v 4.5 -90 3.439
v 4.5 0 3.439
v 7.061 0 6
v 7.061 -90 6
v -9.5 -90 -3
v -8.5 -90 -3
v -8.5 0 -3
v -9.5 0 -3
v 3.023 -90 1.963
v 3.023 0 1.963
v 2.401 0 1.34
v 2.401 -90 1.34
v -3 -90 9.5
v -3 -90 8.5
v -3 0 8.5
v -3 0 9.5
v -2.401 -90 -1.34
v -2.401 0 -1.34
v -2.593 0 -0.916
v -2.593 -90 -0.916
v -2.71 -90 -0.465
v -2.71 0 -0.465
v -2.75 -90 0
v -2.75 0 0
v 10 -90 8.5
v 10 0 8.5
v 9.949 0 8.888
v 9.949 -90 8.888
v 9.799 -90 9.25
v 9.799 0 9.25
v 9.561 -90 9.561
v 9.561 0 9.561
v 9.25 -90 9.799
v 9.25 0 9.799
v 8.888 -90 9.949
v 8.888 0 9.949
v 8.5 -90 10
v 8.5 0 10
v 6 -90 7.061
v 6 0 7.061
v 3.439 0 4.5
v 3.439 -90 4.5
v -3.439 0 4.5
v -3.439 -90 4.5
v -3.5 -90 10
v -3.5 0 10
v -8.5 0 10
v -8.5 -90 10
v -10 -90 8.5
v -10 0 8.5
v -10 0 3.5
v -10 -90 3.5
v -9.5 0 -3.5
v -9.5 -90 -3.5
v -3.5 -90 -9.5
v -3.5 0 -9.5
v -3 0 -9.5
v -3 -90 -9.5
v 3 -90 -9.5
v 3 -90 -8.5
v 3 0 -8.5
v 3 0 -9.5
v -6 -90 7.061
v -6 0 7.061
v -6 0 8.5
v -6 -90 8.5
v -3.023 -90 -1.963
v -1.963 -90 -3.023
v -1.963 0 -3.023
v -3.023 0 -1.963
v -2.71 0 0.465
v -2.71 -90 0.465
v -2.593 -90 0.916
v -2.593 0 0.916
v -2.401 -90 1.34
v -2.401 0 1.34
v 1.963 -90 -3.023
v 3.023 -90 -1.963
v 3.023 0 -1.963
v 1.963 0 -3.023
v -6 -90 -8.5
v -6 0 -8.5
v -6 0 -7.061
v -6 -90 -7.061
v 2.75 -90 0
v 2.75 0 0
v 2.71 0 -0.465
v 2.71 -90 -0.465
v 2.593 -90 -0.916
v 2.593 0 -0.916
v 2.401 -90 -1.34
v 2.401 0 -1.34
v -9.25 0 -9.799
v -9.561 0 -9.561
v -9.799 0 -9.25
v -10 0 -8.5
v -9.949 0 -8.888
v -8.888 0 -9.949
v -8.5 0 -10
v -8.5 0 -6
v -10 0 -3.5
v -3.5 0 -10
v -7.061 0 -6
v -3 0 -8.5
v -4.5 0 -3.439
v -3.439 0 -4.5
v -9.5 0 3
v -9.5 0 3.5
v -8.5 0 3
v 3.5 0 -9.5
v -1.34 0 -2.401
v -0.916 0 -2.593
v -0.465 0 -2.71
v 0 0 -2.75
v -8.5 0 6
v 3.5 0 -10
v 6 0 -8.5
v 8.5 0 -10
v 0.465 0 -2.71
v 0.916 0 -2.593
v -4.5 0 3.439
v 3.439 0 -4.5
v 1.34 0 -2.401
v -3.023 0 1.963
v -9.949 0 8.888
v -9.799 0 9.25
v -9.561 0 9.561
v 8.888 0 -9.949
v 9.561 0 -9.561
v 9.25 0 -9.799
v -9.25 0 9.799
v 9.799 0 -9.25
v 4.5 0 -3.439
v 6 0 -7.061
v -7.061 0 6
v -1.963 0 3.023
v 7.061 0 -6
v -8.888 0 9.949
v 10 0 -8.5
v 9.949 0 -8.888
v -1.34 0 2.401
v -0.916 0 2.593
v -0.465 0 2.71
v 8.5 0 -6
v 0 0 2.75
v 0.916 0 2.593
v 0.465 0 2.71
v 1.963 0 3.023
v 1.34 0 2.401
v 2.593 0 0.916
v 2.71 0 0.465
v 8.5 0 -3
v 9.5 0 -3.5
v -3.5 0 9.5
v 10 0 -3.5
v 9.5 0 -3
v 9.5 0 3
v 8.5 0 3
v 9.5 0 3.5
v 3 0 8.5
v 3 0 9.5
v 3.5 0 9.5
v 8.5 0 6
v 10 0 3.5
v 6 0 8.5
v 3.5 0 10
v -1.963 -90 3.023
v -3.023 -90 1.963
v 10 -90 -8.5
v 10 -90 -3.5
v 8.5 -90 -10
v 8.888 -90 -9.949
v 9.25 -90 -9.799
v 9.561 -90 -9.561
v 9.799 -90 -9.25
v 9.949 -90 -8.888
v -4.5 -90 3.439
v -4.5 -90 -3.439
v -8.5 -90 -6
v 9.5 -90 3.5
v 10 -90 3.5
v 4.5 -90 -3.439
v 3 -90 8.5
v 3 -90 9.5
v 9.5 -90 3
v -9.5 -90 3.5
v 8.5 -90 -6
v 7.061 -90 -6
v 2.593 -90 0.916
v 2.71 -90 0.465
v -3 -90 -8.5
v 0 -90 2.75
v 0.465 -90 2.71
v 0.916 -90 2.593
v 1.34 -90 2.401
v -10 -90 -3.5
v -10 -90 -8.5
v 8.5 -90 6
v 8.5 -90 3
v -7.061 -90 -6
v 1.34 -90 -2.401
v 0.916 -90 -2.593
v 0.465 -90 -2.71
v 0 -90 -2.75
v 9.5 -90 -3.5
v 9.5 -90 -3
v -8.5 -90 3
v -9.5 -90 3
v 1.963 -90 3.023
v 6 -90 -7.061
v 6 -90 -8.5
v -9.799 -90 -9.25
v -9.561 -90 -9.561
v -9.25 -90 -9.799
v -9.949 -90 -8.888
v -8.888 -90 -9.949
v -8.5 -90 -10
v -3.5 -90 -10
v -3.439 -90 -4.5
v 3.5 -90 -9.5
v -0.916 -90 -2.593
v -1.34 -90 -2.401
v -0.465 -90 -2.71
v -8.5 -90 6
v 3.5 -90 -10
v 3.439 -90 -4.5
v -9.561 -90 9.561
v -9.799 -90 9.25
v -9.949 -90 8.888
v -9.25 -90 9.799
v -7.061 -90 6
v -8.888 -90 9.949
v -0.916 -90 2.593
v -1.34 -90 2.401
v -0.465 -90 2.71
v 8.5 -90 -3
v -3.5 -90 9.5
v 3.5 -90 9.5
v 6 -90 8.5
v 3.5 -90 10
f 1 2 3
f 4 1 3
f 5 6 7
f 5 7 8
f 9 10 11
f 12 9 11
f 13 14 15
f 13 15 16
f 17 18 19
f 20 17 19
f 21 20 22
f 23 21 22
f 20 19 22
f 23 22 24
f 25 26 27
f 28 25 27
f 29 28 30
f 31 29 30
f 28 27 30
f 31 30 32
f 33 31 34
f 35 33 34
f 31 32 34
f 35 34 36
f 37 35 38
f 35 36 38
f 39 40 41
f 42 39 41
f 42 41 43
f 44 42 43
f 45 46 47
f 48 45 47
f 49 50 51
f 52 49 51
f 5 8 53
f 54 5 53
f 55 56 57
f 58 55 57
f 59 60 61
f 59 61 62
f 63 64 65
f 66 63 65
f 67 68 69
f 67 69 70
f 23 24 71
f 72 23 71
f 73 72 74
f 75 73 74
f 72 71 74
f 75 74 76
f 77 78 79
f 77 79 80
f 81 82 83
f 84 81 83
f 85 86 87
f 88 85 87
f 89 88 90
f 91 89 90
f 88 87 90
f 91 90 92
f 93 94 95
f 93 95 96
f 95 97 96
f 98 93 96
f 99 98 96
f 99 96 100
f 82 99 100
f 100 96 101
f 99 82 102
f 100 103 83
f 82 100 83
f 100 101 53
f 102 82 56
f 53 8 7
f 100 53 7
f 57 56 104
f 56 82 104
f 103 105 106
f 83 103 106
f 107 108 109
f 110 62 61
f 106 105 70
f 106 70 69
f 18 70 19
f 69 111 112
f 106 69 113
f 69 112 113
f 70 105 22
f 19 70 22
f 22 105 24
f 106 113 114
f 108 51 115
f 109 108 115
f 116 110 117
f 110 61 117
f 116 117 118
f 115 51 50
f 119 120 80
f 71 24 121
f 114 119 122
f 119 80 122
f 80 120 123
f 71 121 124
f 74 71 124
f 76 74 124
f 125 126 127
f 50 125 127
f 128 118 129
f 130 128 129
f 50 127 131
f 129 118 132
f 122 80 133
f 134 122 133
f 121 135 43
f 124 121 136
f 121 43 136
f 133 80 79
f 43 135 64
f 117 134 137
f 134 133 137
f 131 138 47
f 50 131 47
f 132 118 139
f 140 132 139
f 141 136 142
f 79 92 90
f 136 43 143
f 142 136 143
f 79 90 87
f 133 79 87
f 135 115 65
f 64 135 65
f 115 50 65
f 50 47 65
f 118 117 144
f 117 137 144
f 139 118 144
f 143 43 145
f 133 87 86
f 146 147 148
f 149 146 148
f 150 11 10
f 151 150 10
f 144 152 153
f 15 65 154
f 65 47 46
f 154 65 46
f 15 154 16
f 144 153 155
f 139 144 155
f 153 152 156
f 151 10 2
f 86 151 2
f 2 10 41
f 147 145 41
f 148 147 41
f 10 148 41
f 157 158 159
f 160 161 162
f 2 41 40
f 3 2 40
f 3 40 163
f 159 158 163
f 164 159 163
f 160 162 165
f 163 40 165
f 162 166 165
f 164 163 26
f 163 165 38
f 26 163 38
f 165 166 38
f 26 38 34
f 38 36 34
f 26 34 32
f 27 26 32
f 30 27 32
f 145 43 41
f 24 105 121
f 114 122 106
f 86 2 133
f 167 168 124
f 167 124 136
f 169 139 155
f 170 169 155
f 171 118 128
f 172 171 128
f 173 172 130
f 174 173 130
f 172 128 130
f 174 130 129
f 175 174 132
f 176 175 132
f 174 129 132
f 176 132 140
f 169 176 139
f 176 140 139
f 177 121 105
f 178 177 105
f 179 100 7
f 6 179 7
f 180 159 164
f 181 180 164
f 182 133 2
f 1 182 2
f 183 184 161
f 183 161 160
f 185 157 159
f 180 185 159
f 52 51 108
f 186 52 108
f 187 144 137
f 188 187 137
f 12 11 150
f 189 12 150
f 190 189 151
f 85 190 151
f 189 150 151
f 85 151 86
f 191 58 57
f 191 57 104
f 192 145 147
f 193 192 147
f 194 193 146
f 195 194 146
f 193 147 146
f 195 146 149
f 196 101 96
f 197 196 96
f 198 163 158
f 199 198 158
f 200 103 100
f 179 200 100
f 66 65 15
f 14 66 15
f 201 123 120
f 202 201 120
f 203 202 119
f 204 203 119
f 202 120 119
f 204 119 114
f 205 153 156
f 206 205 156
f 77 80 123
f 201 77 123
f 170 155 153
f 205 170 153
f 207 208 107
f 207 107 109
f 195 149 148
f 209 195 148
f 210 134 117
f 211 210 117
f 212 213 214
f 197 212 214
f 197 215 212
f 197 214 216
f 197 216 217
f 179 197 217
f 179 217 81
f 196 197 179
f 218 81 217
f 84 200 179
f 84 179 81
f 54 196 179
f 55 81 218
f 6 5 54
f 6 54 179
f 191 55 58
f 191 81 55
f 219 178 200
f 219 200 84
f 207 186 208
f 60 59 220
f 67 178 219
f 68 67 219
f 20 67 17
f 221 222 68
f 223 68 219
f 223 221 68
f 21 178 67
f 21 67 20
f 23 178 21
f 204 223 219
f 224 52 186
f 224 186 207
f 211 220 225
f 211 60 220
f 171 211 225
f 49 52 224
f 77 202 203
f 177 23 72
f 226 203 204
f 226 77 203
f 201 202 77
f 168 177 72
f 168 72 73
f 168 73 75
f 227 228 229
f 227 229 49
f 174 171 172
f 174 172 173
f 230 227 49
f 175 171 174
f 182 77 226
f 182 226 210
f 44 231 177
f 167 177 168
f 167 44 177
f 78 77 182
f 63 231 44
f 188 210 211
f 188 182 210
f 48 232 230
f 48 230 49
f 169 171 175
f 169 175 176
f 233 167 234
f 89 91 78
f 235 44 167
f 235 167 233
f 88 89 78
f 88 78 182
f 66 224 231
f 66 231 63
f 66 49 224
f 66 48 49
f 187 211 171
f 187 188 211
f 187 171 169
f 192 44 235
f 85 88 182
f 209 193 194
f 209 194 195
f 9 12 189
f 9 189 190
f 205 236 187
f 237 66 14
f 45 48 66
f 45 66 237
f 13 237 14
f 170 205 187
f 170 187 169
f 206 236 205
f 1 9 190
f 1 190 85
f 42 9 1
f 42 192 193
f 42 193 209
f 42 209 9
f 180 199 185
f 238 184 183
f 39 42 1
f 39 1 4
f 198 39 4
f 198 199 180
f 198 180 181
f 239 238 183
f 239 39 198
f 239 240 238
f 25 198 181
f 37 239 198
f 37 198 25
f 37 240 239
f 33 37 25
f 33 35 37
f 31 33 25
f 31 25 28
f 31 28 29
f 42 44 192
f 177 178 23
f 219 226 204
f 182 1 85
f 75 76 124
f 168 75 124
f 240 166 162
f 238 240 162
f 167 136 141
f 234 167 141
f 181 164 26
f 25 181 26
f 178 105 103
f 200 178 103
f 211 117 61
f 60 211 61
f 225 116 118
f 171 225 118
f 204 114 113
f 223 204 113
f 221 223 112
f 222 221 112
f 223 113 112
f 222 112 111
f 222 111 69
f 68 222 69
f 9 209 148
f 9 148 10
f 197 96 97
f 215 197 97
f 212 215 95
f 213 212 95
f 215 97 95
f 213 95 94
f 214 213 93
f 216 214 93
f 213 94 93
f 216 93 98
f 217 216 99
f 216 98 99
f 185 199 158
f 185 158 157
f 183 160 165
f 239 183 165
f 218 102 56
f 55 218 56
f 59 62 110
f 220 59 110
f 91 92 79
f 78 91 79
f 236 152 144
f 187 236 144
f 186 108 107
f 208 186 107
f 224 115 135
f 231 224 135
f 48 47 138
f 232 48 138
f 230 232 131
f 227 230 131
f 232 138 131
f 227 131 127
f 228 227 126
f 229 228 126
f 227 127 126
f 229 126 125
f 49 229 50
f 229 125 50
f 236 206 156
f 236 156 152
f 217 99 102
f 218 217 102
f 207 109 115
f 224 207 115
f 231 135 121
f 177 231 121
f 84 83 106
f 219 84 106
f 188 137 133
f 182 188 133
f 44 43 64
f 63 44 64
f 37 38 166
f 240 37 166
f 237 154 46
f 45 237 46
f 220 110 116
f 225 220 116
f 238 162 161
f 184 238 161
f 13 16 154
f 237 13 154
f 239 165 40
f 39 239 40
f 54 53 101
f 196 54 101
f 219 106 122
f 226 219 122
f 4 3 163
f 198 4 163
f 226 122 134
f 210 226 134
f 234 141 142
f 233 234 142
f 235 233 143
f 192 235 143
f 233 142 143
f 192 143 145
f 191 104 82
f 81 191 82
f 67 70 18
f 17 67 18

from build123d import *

# Parameters (mm, degrees)
F1_DEPTH = 90


with BuildPart() as f1:
    # F0 (on Front) → F1 (new body)
    with BuildSketch(Plane.XZ):
        with BuildLine():
            Line((3.43934, 4.5), (0, 4.5))
            Line((0, 4.5), (-3.43934, 4.5))
            Line((-3.43934, 4.5), (-6, 7.06066))
            Line((-6, 7.06066), (-6, 8.5))
            Line((-6, 8.5), (-3, 8.5))
            Line((-3, 8.5), (-3, 9.5))
            Line((-3, 9.5), (-3.5, 9.5))
            Line((-3.5, 9.5), (-3.5, 10))
            Line((-3.5, 10), (-8.5, 10))
            ThreePointArc((-8.5, 10), (-9.56066, 9.56066), (-10, 8.5))
            Line((-10, 8.5), (-10, 3.5))
            Line((-10, 3.5), (-9.5, 3.5))
            Line((-9.5, 3.5), (-9.5, 3))
            Line((-9.5, 3), (-8.5, 3))
            Line((-8.5, 3), (-8.5, 6))
            Line((-8.5, 6), (-7.06066, 6))
            Line((-7.06066, 6), (-4.5, 3.43934))
            Line((-4.5, 3.43934), (-4.5, 0))
            Line((-4.5, 0), (-4.5, -3.43934))
            Line((-4.5, -3.43934), (-7.06066, -6))
            Line((-7.06066, -6), (-8.5, -6))
            Line((-8.5, -6), (-8.5, -3))
            Line((-8.5, -3), (-9.5, -3))
            Line((-9.5, -3), (-9.5, -3.5))
            Line((-9.5, -3.5), (-10, -3.5))
            Line((-10, -3.5), (-10, -8.5))
            ThreePointArc((-10, -8.5), (-9.56066, -9.56066), (-8.5, -10))
            Line((-8.5, -10), (-3.5, -10))
            Line((-3.5, -10), (-3.5, -9.5))
            Line((-3.5, -9.5), (-3, -9.5))
            Line((-3, -9.5), (-3, -8.5))
            Line((-3, -8.5), (-6, -8.5))
            Line((-6, -8.5), (-6, -7.06066))
            Line((-6, -7.06066), (-3.43934, -4.5))
            Line((-3.43934, -4.5), (0, -4.5))
            Line((0, -4.5), (3.43934, -4.5))
            Line((3.43934, -4.5), (6, -7.06066))
            Line((6, -7.06066), (6, -8.5))
            Line((6, -8.5), (3, -8.5))
            Line((3, -8.5), (3, -9.5))
            Line((3, -9.5), (3.5, -9.5))
            Line((3.5, -9.5), (3.5, -10))
            Line((3.5, -10), (8.5, -10))
            ThreePointArc((8.5, -10), (9.56066, -9.56066), (10, -8.5))
            Line((10, -8.5), (10, -3.5))
            Line((10, -3.5), (9.5, -3.5))
            Line((9.5, -3.5), (9.5, -3))
            Line((9.5, -3), (8.5, -3))
            Line((8.5, -3), (8.5, -6))
            Line((8.5, -6), (7.06066, -6))
            Line((7.06066, -6), (4.5, -3.43934))
            Line((4.5, -3.43934), (4.5, 0))
            Line((4.5, 0), (4.5, 3.43934))
            Line((4.5, 3.43934), (7.06066, 6))
            Line((7.06066, 6), (8.5, 6))
            Line((8.5, 6), (8.5, 3))
            Line((8.5, 3), (9.5, 3))
            Line((9.5, 3), (9.5, 3.5))
            Line((9.5, 3.5), (10, 3.5))
            Line((10, 3.5), (10, 8.5))
            ThreePointArc((10, 8.5), (9.56066, 9.56066), (8.5, 10))
            Line((8.5, 10), (3.5, 10))
            Line((3.5, 10), (3.5, 9.5))
            Line((3.5, 9.5), (3, 9.5))
            Line((3, 9.5), (3, 8.5))
            Line((3, 8.5), (6, 8.5))
            Line((6, 8.5), (6, 7.06066))
            Line((6, 7.06066), (3.43934, 4.5))
        make_face()
        with BuildLine():
            ThreePointArc((-1.340499, 2.401159), (-0.692573, 2.661361), (0, 2.75))
            ThreePointArc((0, 2.75), (0.692573, 2.661361), (1.340499, 2.401159))
            Line((1.340499, 2.401159), (1.962753, 3.023413))
            Line((1.962753, 3.023413), (3.023413, 1.962753))
            Line((3.023413, 1.962753), (2.401159, 1.340499))
            ThreePointArc((2.401159, 1.340499), (2.661361, 0.692573), (2.75, 0))
            ThreePointArc((2.75, 0), (2.661361, -0.692573), (2.401159, -1.340499))
            Line((2.401159, -1.340499), (3.023413, -1.962753))
            Line((3.023413, -1.962753), (1.962753, -3.023413))
            Line((1.962753, -3.023413), (1.340499, -2.401159))
            ThreePointArc((1.340499, -2.401159), (0.692573, -2.661361), (0, -2.75))
            ThreePointArc((0, -2.75), (-0.692573, -2.661361), (-1.340499, -2.401159))
            Line((-1.340499, -2.401159), (-1.962753, -3.023413))
            Line((-1.962753, -3.023413), (-3.023413, -1.962753))
            Line((-3.023413, -1.962753), (-2.401159, -1.340499))
            ThreePointArc((-2.401159, -1.340499), (-2.661361, -0.692573), (-2.75, 0))
            ThreePointArc((-2.75, 0), (-2.661361, 0.692573), (-2.401159, 1.340499))
            Line((-2.401159, 1.340499), (-3.023413, 1.962753))
            Line((-3.023413, 1.962753), (-1.962753, 3.023413))
            Line((-1.962753, 3.023413), (-1.340499, 2.401159))
        make_face(mode=Mode.SUBTRACT)
    extrude(amount=F1_DEPTH)


solid = f1.part
